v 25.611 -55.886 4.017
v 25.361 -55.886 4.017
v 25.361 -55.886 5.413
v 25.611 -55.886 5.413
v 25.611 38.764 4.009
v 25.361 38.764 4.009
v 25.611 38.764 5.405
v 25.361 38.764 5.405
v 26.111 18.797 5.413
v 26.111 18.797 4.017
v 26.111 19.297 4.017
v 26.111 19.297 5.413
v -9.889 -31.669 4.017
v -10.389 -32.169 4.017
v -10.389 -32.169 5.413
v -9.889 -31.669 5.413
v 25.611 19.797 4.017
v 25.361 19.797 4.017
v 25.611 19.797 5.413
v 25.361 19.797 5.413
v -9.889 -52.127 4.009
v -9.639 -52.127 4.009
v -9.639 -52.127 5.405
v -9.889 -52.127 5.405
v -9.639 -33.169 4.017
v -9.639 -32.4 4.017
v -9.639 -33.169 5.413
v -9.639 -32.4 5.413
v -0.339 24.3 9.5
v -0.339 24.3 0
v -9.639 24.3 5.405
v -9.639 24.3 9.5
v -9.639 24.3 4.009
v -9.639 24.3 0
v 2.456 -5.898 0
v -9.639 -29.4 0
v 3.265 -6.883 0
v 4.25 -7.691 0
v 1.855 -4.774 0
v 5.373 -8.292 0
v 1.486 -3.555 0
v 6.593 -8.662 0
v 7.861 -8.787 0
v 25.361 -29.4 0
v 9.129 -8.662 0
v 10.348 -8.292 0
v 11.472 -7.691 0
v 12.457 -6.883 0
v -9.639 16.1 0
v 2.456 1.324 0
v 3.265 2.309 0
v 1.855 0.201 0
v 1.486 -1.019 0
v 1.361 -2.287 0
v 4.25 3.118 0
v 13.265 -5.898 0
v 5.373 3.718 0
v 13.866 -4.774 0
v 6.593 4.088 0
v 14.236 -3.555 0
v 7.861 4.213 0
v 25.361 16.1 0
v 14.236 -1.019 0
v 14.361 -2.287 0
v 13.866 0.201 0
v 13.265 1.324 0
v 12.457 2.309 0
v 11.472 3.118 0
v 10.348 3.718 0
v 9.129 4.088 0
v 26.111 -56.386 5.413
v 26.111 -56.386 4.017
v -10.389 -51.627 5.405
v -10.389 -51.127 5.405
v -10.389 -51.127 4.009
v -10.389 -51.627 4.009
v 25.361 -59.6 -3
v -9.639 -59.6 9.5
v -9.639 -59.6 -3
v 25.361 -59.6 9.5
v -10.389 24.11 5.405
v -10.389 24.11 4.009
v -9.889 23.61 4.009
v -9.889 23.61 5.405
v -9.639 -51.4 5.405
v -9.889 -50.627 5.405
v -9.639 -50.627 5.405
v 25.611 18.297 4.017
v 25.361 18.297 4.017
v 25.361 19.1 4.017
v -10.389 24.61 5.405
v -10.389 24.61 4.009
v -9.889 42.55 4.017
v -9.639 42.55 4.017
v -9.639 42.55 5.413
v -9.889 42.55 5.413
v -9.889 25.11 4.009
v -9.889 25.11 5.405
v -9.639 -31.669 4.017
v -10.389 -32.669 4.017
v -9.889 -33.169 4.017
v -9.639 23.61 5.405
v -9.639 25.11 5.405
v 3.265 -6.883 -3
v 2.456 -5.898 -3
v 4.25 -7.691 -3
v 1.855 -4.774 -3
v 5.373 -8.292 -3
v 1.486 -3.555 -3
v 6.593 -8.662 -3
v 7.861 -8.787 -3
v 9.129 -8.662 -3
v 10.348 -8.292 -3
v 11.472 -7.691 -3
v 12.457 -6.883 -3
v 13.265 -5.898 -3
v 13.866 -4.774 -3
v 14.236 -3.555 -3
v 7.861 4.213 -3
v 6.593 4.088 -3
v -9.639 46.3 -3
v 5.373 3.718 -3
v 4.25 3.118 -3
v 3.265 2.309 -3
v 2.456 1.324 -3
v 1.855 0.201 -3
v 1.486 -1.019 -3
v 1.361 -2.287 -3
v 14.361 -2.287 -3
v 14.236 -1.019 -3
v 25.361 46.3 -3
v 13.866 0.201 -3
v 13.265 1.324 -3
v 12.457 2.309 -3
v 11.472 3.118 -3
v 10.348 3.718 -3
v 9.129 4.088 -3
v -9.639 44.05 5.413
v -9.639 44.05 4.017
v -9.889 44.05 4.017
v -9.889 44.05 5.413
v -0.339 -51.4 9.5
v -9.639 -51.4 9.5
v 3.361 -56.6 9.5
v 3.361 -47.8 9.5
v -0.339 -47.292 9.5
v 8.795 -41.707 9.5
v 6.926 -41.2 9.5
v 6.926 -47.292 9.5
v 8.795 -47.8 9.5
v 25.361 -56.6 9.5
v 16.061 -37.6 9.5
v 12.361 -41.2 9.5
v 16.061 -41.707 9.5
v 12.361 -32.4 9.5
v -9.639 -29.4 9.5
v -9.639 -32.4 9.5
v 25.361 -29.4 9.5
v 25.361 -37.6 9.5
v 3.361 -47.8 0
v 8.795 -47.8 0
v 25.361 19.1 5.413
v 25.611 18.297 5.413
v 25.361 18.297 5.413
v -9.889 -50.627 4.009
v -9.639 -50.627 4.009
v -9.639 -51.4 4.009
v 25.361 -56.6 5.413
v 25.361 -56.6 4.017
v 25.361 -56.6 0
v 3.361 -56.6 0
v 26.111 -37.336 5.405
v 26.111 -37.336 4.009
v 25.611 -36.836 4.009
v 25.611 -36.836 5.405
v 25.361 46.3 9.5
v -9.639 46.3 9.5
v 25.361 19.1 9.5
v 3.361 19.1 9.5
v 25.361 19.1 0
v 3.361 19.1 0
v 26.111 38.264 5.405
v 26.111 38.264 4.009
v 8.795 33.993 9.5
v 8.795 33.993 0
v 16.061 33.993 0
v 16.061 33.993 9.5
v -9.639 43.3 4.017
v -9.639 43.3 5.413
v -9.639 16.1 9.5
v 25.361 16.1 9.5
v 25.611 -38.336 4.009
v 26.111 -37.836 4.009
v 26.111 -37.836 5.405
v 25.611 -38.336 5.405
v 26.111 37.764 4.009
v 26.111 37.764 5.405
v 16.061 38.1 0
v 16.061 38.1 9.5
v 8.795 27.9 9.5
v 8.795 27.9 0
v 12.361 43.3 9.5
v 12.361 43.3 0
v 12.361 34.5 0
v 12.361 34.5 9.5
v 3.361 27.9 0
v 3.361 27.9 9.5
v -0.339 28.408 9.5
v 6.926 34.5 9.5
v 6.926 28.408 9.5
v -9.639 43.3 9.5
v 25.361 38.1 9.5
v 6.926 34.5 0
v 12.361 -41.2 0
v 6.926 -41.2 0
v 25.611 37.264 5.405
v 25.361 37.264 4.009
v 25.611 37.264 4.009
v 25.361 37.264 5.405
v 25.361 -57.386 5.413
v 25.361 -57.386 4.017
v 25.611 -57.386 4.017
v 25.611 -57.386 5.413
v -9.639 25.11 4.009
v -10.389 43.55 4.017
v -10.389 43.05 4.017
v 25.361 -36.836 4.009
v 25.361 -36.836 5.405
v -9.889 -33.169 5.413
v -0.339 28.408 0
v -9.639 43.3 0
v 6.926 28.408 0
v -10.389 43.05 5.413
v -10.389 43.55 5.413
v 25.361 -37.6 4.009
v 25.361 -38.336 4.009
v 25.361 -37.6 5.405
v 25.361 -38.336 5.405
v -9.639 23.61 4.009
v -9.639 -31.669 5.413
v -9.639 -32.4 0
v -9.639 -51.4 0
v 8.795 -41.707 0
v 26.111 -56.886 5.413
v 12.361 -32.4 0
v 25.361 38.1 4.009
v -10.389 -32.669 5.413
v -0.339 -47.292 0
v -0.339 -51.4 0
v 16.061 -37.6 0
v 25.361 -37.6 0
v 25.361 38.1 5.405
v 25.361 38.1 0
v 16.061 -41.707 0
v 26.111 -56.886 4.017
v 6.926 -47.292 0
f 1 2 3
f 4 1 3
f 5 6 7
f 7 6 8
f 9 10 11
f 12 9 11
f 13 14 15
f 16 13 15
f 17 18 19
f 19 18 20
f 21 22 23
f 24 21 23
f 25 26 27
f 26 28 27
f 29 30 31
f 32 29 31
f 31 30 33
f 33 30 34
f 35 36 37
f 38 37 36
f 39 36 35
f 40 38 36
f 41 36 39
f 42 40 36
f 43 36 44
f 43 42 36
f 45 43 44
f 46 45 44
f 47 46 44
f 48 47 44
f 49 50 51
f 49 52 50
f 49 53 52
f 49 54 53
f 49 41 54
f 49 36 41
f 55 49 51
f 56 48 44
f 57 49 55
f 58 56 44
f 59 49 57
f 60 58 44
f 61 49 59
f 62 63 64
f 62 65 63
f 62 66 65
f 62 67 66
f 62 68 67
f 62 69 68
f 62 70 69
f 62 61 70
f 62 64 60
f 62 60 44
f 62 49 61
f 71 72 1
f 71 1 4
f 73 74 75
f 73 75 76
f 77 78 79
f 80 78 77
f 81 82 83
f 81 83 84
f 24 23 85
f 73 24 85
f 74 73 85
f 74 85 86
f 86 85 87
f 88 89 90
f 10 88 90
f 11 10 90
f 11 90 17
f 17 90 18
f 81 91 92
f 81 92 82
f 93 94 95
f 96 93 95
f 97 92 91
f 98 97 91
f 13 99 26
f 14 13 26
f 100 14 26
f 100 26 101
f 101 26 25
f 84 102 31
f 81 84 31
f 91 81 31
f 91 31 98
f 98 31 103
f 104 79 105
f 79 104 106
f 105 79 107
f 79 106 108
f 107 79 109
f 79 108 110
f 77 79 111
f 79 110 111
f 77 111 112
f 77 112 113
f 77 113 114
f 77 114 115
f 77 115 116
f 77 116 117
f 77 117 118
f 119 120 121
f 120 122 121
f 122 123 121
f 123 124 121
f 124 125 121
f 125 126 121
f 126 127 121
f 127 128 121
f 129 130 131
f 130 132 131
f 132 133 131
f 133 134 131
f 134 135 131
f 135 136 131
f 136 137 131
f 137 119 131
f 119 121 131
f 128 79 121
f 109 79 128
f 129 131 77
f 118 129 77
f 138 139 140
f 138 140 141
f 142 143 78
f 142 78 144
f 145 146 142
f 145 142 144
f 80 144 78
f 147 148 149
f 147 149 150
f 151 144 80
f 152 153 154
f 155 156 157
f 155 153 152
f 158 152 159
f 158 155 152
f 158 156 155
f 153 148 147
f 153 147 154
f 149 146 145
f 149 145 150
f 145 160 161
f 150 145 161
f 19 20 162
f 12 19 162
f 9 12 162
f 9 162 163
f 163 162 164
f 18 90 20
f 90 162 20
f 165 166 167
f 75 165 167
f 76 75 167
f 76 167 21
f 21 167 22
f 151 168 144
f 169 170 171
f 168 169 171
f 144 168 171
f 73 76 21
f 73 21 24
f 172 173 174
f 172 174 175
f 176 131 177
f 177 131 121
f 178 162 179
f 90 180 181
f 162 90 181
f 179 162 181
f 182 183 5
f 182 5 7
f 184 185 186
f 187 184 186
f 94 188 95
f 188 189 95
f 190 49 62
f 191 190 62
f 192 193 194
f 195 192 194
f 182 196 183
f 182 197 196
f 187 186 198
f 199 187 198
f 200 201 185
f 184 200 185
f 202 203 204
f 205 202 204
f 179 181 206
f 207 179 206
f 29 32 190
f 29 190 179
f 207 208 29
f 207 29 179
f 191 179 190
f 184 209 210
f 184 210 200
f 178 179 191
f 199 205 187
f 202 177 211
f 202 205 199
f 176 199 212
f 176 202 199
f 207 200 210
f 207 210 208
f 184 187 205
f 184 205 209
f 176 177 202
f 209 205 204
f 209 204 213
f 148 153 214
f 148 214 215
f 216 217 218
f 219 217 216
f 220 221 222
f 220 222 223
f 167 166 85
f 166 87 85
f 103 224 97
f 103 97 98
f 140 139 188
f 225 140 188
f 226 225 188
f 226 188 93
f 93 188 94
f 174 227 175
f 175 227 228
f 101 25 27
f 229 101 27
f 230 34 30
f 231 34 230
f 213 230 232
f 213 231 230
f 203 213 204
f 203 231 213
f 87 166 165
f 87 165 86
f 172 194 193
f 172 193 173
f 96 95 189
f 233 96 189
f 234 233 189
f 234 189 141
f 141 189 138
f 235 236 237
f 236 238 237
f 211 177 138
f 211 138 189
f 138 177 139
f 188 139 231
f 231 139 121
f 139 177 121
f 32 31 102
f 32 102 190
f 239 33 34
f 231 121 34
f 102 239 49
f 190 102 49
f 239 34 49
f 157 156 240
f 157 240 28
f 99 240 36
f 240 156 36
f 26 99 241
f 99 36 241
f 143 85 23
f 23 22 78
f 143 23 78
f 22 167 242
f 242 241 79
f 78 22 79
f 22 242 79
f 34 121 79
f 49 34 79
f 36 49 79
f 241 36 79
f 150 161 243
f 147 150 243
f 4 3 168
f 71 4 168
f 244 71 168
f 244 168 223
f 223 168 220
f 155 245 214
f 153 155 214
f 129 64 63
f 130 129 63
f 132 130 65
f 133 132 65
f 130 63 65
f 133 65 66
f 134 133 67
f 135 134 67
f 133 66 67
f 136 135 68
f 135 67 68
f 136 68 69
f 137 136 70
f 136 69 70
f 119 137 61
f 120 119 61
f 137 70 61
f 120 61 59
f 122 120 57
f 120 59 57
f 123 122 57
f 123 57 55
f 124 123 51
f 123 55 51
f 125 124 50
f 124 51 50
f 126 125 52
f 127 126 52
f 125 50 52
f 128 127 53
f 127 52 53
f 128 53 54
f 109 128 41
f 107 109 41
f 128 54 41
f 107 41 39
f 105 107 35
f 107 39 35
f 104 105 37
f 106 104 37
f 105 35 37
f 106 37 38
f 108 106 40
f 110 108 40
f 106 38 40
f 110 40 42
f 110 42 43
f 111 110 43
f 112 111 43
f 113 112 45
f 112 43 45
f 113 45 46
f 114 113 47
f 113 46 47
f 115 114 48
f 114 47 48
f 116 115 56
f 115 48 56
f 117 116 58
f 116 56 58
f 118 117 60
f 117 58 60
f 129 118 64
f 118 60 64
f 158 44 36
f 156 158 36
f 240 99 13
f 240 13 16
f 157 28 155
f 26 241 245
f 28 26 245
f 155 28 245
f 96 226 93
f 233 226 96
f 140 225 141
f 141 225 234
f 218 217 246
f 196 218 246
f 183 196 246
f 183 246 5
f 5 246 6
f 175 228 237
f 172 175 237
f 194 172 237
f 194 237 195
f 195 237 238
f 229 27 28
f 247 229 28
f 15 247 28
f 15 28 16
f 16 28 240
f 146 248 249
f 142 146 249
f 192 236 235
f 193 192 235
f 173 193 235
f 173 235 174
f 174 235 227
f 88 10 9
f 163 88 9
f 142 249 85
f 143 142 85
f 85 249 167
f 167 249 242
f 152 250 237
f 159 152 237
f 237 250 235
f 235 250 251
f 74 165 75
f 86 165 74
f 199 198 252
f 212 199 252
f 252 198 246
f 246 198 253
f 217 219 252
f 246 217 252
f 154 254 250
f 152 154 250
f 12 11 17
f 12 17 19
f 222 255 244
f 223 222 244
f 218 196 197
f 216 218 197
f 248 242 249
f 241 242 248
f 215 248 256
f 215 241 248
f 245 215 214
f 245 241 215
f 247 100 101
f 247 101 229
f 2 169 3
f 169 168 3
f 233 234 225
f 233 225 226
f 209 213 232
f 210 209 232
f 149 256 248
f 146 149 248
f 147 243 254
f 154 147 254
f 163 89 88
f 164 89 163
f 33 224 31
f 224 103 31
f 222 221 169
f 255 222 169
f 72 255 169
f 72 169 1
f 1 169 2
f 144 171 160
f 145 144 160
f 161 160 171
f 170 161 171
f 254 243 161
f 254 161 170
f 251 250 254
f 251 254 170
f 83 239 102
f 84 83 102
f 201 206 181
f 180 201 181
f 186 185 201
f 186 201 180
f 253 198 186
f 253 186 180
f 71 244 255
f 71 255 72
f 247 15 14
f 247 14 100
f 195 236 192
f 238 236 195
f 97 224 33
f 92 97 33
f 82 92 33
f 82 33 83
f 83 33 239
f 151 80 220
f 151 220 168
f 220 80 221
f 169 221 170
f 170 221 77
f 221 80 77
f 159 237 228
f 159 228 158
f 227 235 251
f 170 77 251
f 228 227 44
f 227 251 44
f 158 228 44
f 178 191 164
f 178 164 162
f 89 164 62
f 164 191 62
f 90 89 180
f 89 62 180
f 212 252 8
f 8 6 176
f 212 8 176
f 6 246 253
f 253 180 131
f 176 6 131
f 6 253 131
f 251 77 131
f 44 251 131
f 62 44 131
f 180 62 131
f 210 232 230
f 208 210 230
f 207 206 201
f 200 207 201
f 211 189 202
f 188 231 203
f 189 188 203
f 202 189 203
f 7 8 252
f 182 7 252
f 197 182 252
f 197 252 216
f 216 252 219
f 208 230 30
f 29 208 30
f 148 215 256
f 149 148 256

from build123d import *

# Parameters (mm, degrees)
F0_R     = 6.5
F1_DEPTH = 3
F2_DEPTH = 9.5
F3_W     = 0.6965331137
F3_H     = 1.3967012055
F3_W_2   = 0.8034668863
F3_W_3   = 0.836771971
F3_W_4   = 0.663228029
F3_W_5   = 0.7633265793
F3_W_6   = 0.7366734207
F3_W_7   = 0.7139041424
F3_W_8   = 0.7860958576
F4_DEPTH = 0.75
F5_W     = 0.7277277052
F5_H     = 1.3967012055
F5_W_2   = 0.7722722948
F5_W_3   = 0.7690980434
F5_W_4   = 0.7309019566
F5_W_5   = 0.6904412746
F5_W_6   = 0.8095587254
F5_W_7   = 0.7503486574
F5_W_8   = 0.7496513426
F6_DEPTH = 0.75
F7_SIZE  = 0.5


# Not quite as in the source:
# - ends of sketch curves that miss each other by under 0.0002 mm in the source are joined
# - a feature names something its author has since deleted; it is built from what else it names


with BuildPart() as f1:
    # F0 (on Top) → F1 (new body)
    with BuildSketch(Plane.XY):
        Polygon((7.8607099131, 16.1003852367), (-9.6392899379, 16.1003852367), (-9.6392899379, -29.3996147633), (25.3607097641, -29.3996147633), (25.3607097641, 16.1003852367), align=None)
        with Locations((7.8607099131, -2.2867515218)):
            Circle(F0_R, mode=Mode.SUBTRACT)
        Polygon((25.3607097641, -29.3996147633), (-9.6392899379, -29.3996147633), (-9.6392899379, -32.3996147633), (-6.4715547308, -32.3996147633), (12.3607100621, -32.3996147633), (25.3607097641, -32.3996147633), align=None)
        Polygon((-9.6392899379, 46.3003852367), (-9.6392899379, 43.3003852367), (-6.4715547308, 43.3003852367), (12.3607100621, 43.3003852367), (25.3607097641, 43.3003852367), (25.3607097641, 46.3003852367), align=None)
        Polygon((16.0607097641, 38.1003852367), (25.3607097641, 38.1003852367), (25.3607097641, 43.3003852367), (12.3607100621, 43.3003852367), (12.3607100621, 35.3003852367), (12.3607100621, 34.5003852367), (7.8607097641, 34.5003852367), (7.8607100621, 33.9926332235), (8.7954637781, 33.9926332235), (16.0607097641, 33.9926332235), align=None)
        Polygon((-9.6392899379, 43.3003852367), (-9.6392899379, 24.3003852367), (-0.3392899379, 24.3003852367), (-0.3392899379, 28.4081372499), (6.9259563461, 28.4081372499), (6.9259563461, 34.5003852367), (7.8607100621, 34.5003852367), (12.3607100621, 34.5003852367), (12.3607100621, 35.3003852367), (12.3607100621, 43.3003852367), (-6.4715547308, 43.3003852367), align=None)
        Polygon((3.3607097641, 27.1003852367), (3.3607097641, 19.1003852367), (22.192974557, 19.1003852367), (25.3607097641, 19.1003852367), (25.3607097641, 38.1003852367), (16.0607097641, 38.1003852367), (16.0607097641, 33.9926332235), (8.7954637781, 33.9926332235), (8.7954637781, 27.9003852367), (7.8607100621, 27.9003852367), (3.3607097641, 27.9003852367), align=None)
        Polygon((-9.6392899379, 19.1003852367), (-9.6392899379, 16.1003852367), (7.8607099131, 16.1003852367), (25.3607097641, 16.1003852367), (25.3607097641, 19.1003852367), (22.192974557, 19.1003852367), (3.3607097641, 19.1003852367), align=None)
        Polygon((-9.6392899379, 24.3003852367), (-9.6392899379, 19.1003852367), (3.3607097641, 19.1003852367), (3.3607097641, 27.1003852367), (3.3607097641, 27.9003852367), (7.8607100621, 27.9003852367), (7.8607100621, 28.4081372499), (6.9259563461, 28.4081372499), (-0.3392899379, 28.4081372499), (-0.3392899379, 24.3003852367), align=None)
        Polygon((6.9259563461, 34.5003852367), (6.9259563461, 28.4081372499), (7.8607097641, 28.4081372499), (7.8607100621, 33.9926332235), (7.8607100621, 34.5003852367), align=None)
        Polygon((7.8607100621, 28.4081372499), (7.8607100621, 27.9003852367), (8.7954637781, 27.9003852367), (8.7954637781, 33.9926332235), (7.8607097641, 33.9926332235), align=None)
        Polygon((-6.4715547308, -32.3996147633), (-9.6392899379, -32.3996147633), (-9.6392899379, -51.3996147633), (-0.3392899379, -51.3996147633), (-0.3392899379, -47.2918627501), (6.9259563461, -47.2918627501), (6.9259563461, -41.1996147633), (7.8607100621, -41.1996147633), (12.3607100621, -41.1996147633), (12.3607100621, -40.3996147633), (12.3607100621, -32.3996147633), align=None)
        Polygon((25.3607097641, -56.5996147633), (25.3607097641, -37.5996147633), (16.0607097641, -37.5996147633), (16.0607097641, -41.7073667765), (8.7954637781, -41.7073667765), (8.7954637781, -47.7996147633), (7.8607100621, -47.7996147633), (3.3607097641, -47.7996147633), (3.3607097641, -48.5996147633), (3.3607097641, -56.5996147633), (22.192974557, -56.5996147633), align=None)
        Polygon((25.3607097641, -37.5996147633), (25.3607097641, -32.3996147633), (12.3607100621, -32.3996147633), (12.3607100621, -40.3996147633), (12.3607100621, -41.1996147633), (7.8607097641, -41.1996147633), (7.8607100621, -41.7073667765), (8.7954637781, -41.7073667765), (16.0607097641, -41.7073667765), (16.0607097641, -37.5996147633), align=None)
        Polygon((-0.3392899379, -51.3996147633), (-9.6392899379, -51.3996147633), (-9.6392899379, -56.5996147633), (3.3607097641, -56.5996147633), (3.3607097641, -48.5996147633), (3.3607097641, -47.7996147633), (7.8607100621, -47.7996147633), (7.8607100621, -47.2918627501), (6.9259563461, -47.2918627501), (-0.3392899379, -47.2918627501), align=None)
        Polygon((8.7954637781, -47.7996147633), (8.7954637781, -41.7073667765), (7.8607097641, -41.7073667765), (7.8607100621, -47.2918627501), (7.8607100621, -47.7996147633), align=None)
        Polygon((6.9259563461, -41.1996147633), (6.9259563461, -47.2918627501), (7.8607097641, -47.2918627501), (7.8607100621, -41.7073667765), (7.8607100621, -41.1996147633), align=None)
        Polygon((3.3607097641, -56.5996147633), (-9.6392899379, -56.5996147633), (-9.6392899379, -59.5996147633), (25.3607097641, -59.5996147633), (25.3607097641, -56.5996147633), (22.192974557, -56.5996147633), align=None)
    extrude(amount=-F1_DEPTH)

    # F0 (on Top) → F2 (join)
    with BuildSketch(Plane.XY):
        Polygon((-9.6392899379, 19.1003852367), (-9.6392899379, 16.1003852367), (7.8607099131, 16.1003852367), (25.3607097641, 16.1003852367), (25.3607097641, 19.1003852367), (22.192974557, 19.1003852367), (3.3607097641, 19.1003852367), align=None)
        Polygon((-9.6392899379, 24.3003852367), (-9.6392899379, 19.1003852367), (3.3607097641, 19.1003852367), (3.3607097641, 27.1003852367), (3.3607097641, 27.9003852367), (7.8607100621, 27.9003852367), (7.8607100621, 28.4081372499), (6.9259563461, 28.4081372499), (-0.3392899379, 28.4081372499), (-0.3392899379, 24.3003852367), align=None)
        Polygon((-9.6392899379, 46.3003852367), (-9.6392899379, 43.3003852367), (-6.4715547308, 43.3003852367), (12.3607100621, 43.3003852367), (25.3607097641, 43.3003852367), (25.3607097641, 46.3003852367), align=None)
        Polygon((16.0607097641, 38.1003852367), (25.3607097641, 38.1003852367), (25.3607097641, 43.3003852367), (12.3607100621, 43.3003852367), (12.3607100621, 35.3003852367), (12.3607100621, 34.5003852367), (7.8607097641, 34.5003852367), (7.8607100621, 33.9926332235), (8.7954637781, 33.9926332235), (16.0607097641, 33.9926332235), align=None)
        Polygon((6.9259563461, 34.5003852367), (6.9259563461, 28.4081372499), (7.8607097641, 28.4081372499), (7.8607100621, 33.9926332235), (7.8607100621, 34.5003852367), align=None)
        Polygon((7.8607100621, 28.4081372499), (7.8607100621, 27.9003852367), (8.7954637781, 27.9003852367), (8.7954637781, 33.9926332235), (7.8607097641, 33.9926332235), align=None)
        Polygon((25.3607097641, -29.3996147633), (-9.6392899379, -29.3996147633), (-9.6392899379, -32.3996147633), (-6.4715547308, -32.3996147633), (12.3607100621, -32.3996147633), (25.3607097641, -32.3996147633), align=None)
        Polygon((25.3607097641, -37.5996147633), (25.3607097641, -32.3996147633), (12.3607100621, -32.3996147633), (12.3607100621, -40.3996147633), (12.3607100621, -41.1996147633), (7.8607097641, -41.1996147633), (7.8607100621, -41.7073667765), (8.7954637781, -41.7073667765), (16.0607097641, -41.7073667765), (16.0607097641, -37.5996147633), align=None)
        Polygon((-0.3392899379, -51.3996147633), (-9.6392899379, -51.3996147633), (-9.6392899379, -56.5996147633), (3.3607097641, -56.5996147633), (3.3607097641, -48.5996147633), (3.3607097641, -47.7996147633), (7.8607100621, -47.7996147633), (7.8607100621, -47.2918627501), (6.9259563461, -47.2918627501), (-0.3392899379, -47.2918627501), align=None)
        Polygon((8.7954637781, -47.7996147633), (8.7954637781, -41.7073667765), (7.8607097641, -41.7073667765), (7.8607100621, -47.2918627501), (7.8607100621, -47.7996147633), align=None)
        Polygon((6.9259563461, -41.1996147633), (6.9259563461, -47.2918627501), (7.8607097641, -47.2918627501), (7.8607100621, -41.7073667765), (7.8607100621, -41.1996147633), align=None)
        Polygon((3.3607097641, -56.5996147633), (-9.6392899379, -56.5996147633), (-9.6392899379, -59.5996147633), (25.3607097641, -59.5996147633), (25.3607097641, -56.5996147633), (22.192974557, -56.5996147633), align=None)
    extrude(amount=F2_DEPTH)

    # F3 (on face) → F4 (join)
    with BuildSketch(Plane.YZ.offset(25.3607097641)):
        with Locations((19.4486517936, 4.715041643)):
            Rectangle(F3_W, F3_H)
        with Locations((18.6986517936, 4.715041643)):
            Rectangle(F3_W_2, F3_H)
        with Locations((37.6819992512, 4.7070782166)):
            Rectangle(F3_W_3, F3_H)
        with Locations((38.4319992512, 4.7070782166)):
            Rectangle(F3_W_4, F3_H)
        with Locations((-37.2179514736, 4.7070782166)):
            Rectangle(F3_W_5, F3_H)
        with Locations((-37.9679514736, 4.7070782166)):
            Rectangle(F3_W_6, F3_H)
        with Locations((-56.2426626921, 4.715041643)):
            Rectangle(F3_W_7, F3_H)
        with Locations((-56.9926626921, 4.715041643)):
            Rectangle(F3_W_8, F3_H)
    extrude(amount=F4_DEPTH)

    # F5 (on face) → F6 (join)
    with BuildSketch(Plane(origin=(-9.6392899379, 0, 0), x_dir=(0, -1, 0), z_dir=(-1, 0, 0))):
        with Locations((51.7634786159, 4.7070782166)):
            Rectangle(F5_W, F5_H)
        with Locations((51.0134786159, 4.7070782166)):
            Rectangle(F5_W_2, F5_H)
        with Locations((32.784163785, 4.715041643)):
            Rectangle(F5_W_3, F5_H)
        with Locations((32.034163785, 4.715041643)):
            Rectangle(F5_W_4, F5_H)
        with Locations((-23.9551645994, 4.7070782166)):
            Rectangle(F5_W_5, F5_H)
        with Locations((-24.7051645994, 4.7070782166)):
            Rectangle(F5_W_6, F5_H)
        with Locations((-42.9252109081, 4.715041643)):
            Rectangle(F5_W_7, F5_H)
        with Locations((-43.6752109081, 4.715041643)):
            Rectangle(F5_W_8, F5_H)
    extrude(amount=F6_DEPTH)

    # F7
    f7_edges = [f1.edges().sort_by_distance(p)[0] for p in [
        (26.11071, 38.763613, 4.707078),
        (26.11071, 37.263613, 4.707078),
        (26.11071, 19.796918, 4.715042),
        (26.11071, 18.296918, 4.715042),
        (26.11071, -36.836288, 4.707078),
        (26.11071, -38.336288, 4.707078),
        (26.11071, -55.885711, 4.715042),
        (26.11071, -57.385711, 4.715042),
        (-10.38929, -52.127342, 4.707078),
        (-10.38929, -50.627342, 4.707078),
        (-10.38929, -33.168713, 4.715042),
        (-10.38929, -31.668713, 4.715042),
        (-10.38929, 23.609944, 4.707078),
        (-10.38929, 25.109944, 4.707078),
        (-10.38929, 42.550037, 4.715042),
        (-10.38929, 44.050037, 4.715042),
    ]]
    chamfer(f7_edges, length=F7_SIZE)


solid = f1.part
